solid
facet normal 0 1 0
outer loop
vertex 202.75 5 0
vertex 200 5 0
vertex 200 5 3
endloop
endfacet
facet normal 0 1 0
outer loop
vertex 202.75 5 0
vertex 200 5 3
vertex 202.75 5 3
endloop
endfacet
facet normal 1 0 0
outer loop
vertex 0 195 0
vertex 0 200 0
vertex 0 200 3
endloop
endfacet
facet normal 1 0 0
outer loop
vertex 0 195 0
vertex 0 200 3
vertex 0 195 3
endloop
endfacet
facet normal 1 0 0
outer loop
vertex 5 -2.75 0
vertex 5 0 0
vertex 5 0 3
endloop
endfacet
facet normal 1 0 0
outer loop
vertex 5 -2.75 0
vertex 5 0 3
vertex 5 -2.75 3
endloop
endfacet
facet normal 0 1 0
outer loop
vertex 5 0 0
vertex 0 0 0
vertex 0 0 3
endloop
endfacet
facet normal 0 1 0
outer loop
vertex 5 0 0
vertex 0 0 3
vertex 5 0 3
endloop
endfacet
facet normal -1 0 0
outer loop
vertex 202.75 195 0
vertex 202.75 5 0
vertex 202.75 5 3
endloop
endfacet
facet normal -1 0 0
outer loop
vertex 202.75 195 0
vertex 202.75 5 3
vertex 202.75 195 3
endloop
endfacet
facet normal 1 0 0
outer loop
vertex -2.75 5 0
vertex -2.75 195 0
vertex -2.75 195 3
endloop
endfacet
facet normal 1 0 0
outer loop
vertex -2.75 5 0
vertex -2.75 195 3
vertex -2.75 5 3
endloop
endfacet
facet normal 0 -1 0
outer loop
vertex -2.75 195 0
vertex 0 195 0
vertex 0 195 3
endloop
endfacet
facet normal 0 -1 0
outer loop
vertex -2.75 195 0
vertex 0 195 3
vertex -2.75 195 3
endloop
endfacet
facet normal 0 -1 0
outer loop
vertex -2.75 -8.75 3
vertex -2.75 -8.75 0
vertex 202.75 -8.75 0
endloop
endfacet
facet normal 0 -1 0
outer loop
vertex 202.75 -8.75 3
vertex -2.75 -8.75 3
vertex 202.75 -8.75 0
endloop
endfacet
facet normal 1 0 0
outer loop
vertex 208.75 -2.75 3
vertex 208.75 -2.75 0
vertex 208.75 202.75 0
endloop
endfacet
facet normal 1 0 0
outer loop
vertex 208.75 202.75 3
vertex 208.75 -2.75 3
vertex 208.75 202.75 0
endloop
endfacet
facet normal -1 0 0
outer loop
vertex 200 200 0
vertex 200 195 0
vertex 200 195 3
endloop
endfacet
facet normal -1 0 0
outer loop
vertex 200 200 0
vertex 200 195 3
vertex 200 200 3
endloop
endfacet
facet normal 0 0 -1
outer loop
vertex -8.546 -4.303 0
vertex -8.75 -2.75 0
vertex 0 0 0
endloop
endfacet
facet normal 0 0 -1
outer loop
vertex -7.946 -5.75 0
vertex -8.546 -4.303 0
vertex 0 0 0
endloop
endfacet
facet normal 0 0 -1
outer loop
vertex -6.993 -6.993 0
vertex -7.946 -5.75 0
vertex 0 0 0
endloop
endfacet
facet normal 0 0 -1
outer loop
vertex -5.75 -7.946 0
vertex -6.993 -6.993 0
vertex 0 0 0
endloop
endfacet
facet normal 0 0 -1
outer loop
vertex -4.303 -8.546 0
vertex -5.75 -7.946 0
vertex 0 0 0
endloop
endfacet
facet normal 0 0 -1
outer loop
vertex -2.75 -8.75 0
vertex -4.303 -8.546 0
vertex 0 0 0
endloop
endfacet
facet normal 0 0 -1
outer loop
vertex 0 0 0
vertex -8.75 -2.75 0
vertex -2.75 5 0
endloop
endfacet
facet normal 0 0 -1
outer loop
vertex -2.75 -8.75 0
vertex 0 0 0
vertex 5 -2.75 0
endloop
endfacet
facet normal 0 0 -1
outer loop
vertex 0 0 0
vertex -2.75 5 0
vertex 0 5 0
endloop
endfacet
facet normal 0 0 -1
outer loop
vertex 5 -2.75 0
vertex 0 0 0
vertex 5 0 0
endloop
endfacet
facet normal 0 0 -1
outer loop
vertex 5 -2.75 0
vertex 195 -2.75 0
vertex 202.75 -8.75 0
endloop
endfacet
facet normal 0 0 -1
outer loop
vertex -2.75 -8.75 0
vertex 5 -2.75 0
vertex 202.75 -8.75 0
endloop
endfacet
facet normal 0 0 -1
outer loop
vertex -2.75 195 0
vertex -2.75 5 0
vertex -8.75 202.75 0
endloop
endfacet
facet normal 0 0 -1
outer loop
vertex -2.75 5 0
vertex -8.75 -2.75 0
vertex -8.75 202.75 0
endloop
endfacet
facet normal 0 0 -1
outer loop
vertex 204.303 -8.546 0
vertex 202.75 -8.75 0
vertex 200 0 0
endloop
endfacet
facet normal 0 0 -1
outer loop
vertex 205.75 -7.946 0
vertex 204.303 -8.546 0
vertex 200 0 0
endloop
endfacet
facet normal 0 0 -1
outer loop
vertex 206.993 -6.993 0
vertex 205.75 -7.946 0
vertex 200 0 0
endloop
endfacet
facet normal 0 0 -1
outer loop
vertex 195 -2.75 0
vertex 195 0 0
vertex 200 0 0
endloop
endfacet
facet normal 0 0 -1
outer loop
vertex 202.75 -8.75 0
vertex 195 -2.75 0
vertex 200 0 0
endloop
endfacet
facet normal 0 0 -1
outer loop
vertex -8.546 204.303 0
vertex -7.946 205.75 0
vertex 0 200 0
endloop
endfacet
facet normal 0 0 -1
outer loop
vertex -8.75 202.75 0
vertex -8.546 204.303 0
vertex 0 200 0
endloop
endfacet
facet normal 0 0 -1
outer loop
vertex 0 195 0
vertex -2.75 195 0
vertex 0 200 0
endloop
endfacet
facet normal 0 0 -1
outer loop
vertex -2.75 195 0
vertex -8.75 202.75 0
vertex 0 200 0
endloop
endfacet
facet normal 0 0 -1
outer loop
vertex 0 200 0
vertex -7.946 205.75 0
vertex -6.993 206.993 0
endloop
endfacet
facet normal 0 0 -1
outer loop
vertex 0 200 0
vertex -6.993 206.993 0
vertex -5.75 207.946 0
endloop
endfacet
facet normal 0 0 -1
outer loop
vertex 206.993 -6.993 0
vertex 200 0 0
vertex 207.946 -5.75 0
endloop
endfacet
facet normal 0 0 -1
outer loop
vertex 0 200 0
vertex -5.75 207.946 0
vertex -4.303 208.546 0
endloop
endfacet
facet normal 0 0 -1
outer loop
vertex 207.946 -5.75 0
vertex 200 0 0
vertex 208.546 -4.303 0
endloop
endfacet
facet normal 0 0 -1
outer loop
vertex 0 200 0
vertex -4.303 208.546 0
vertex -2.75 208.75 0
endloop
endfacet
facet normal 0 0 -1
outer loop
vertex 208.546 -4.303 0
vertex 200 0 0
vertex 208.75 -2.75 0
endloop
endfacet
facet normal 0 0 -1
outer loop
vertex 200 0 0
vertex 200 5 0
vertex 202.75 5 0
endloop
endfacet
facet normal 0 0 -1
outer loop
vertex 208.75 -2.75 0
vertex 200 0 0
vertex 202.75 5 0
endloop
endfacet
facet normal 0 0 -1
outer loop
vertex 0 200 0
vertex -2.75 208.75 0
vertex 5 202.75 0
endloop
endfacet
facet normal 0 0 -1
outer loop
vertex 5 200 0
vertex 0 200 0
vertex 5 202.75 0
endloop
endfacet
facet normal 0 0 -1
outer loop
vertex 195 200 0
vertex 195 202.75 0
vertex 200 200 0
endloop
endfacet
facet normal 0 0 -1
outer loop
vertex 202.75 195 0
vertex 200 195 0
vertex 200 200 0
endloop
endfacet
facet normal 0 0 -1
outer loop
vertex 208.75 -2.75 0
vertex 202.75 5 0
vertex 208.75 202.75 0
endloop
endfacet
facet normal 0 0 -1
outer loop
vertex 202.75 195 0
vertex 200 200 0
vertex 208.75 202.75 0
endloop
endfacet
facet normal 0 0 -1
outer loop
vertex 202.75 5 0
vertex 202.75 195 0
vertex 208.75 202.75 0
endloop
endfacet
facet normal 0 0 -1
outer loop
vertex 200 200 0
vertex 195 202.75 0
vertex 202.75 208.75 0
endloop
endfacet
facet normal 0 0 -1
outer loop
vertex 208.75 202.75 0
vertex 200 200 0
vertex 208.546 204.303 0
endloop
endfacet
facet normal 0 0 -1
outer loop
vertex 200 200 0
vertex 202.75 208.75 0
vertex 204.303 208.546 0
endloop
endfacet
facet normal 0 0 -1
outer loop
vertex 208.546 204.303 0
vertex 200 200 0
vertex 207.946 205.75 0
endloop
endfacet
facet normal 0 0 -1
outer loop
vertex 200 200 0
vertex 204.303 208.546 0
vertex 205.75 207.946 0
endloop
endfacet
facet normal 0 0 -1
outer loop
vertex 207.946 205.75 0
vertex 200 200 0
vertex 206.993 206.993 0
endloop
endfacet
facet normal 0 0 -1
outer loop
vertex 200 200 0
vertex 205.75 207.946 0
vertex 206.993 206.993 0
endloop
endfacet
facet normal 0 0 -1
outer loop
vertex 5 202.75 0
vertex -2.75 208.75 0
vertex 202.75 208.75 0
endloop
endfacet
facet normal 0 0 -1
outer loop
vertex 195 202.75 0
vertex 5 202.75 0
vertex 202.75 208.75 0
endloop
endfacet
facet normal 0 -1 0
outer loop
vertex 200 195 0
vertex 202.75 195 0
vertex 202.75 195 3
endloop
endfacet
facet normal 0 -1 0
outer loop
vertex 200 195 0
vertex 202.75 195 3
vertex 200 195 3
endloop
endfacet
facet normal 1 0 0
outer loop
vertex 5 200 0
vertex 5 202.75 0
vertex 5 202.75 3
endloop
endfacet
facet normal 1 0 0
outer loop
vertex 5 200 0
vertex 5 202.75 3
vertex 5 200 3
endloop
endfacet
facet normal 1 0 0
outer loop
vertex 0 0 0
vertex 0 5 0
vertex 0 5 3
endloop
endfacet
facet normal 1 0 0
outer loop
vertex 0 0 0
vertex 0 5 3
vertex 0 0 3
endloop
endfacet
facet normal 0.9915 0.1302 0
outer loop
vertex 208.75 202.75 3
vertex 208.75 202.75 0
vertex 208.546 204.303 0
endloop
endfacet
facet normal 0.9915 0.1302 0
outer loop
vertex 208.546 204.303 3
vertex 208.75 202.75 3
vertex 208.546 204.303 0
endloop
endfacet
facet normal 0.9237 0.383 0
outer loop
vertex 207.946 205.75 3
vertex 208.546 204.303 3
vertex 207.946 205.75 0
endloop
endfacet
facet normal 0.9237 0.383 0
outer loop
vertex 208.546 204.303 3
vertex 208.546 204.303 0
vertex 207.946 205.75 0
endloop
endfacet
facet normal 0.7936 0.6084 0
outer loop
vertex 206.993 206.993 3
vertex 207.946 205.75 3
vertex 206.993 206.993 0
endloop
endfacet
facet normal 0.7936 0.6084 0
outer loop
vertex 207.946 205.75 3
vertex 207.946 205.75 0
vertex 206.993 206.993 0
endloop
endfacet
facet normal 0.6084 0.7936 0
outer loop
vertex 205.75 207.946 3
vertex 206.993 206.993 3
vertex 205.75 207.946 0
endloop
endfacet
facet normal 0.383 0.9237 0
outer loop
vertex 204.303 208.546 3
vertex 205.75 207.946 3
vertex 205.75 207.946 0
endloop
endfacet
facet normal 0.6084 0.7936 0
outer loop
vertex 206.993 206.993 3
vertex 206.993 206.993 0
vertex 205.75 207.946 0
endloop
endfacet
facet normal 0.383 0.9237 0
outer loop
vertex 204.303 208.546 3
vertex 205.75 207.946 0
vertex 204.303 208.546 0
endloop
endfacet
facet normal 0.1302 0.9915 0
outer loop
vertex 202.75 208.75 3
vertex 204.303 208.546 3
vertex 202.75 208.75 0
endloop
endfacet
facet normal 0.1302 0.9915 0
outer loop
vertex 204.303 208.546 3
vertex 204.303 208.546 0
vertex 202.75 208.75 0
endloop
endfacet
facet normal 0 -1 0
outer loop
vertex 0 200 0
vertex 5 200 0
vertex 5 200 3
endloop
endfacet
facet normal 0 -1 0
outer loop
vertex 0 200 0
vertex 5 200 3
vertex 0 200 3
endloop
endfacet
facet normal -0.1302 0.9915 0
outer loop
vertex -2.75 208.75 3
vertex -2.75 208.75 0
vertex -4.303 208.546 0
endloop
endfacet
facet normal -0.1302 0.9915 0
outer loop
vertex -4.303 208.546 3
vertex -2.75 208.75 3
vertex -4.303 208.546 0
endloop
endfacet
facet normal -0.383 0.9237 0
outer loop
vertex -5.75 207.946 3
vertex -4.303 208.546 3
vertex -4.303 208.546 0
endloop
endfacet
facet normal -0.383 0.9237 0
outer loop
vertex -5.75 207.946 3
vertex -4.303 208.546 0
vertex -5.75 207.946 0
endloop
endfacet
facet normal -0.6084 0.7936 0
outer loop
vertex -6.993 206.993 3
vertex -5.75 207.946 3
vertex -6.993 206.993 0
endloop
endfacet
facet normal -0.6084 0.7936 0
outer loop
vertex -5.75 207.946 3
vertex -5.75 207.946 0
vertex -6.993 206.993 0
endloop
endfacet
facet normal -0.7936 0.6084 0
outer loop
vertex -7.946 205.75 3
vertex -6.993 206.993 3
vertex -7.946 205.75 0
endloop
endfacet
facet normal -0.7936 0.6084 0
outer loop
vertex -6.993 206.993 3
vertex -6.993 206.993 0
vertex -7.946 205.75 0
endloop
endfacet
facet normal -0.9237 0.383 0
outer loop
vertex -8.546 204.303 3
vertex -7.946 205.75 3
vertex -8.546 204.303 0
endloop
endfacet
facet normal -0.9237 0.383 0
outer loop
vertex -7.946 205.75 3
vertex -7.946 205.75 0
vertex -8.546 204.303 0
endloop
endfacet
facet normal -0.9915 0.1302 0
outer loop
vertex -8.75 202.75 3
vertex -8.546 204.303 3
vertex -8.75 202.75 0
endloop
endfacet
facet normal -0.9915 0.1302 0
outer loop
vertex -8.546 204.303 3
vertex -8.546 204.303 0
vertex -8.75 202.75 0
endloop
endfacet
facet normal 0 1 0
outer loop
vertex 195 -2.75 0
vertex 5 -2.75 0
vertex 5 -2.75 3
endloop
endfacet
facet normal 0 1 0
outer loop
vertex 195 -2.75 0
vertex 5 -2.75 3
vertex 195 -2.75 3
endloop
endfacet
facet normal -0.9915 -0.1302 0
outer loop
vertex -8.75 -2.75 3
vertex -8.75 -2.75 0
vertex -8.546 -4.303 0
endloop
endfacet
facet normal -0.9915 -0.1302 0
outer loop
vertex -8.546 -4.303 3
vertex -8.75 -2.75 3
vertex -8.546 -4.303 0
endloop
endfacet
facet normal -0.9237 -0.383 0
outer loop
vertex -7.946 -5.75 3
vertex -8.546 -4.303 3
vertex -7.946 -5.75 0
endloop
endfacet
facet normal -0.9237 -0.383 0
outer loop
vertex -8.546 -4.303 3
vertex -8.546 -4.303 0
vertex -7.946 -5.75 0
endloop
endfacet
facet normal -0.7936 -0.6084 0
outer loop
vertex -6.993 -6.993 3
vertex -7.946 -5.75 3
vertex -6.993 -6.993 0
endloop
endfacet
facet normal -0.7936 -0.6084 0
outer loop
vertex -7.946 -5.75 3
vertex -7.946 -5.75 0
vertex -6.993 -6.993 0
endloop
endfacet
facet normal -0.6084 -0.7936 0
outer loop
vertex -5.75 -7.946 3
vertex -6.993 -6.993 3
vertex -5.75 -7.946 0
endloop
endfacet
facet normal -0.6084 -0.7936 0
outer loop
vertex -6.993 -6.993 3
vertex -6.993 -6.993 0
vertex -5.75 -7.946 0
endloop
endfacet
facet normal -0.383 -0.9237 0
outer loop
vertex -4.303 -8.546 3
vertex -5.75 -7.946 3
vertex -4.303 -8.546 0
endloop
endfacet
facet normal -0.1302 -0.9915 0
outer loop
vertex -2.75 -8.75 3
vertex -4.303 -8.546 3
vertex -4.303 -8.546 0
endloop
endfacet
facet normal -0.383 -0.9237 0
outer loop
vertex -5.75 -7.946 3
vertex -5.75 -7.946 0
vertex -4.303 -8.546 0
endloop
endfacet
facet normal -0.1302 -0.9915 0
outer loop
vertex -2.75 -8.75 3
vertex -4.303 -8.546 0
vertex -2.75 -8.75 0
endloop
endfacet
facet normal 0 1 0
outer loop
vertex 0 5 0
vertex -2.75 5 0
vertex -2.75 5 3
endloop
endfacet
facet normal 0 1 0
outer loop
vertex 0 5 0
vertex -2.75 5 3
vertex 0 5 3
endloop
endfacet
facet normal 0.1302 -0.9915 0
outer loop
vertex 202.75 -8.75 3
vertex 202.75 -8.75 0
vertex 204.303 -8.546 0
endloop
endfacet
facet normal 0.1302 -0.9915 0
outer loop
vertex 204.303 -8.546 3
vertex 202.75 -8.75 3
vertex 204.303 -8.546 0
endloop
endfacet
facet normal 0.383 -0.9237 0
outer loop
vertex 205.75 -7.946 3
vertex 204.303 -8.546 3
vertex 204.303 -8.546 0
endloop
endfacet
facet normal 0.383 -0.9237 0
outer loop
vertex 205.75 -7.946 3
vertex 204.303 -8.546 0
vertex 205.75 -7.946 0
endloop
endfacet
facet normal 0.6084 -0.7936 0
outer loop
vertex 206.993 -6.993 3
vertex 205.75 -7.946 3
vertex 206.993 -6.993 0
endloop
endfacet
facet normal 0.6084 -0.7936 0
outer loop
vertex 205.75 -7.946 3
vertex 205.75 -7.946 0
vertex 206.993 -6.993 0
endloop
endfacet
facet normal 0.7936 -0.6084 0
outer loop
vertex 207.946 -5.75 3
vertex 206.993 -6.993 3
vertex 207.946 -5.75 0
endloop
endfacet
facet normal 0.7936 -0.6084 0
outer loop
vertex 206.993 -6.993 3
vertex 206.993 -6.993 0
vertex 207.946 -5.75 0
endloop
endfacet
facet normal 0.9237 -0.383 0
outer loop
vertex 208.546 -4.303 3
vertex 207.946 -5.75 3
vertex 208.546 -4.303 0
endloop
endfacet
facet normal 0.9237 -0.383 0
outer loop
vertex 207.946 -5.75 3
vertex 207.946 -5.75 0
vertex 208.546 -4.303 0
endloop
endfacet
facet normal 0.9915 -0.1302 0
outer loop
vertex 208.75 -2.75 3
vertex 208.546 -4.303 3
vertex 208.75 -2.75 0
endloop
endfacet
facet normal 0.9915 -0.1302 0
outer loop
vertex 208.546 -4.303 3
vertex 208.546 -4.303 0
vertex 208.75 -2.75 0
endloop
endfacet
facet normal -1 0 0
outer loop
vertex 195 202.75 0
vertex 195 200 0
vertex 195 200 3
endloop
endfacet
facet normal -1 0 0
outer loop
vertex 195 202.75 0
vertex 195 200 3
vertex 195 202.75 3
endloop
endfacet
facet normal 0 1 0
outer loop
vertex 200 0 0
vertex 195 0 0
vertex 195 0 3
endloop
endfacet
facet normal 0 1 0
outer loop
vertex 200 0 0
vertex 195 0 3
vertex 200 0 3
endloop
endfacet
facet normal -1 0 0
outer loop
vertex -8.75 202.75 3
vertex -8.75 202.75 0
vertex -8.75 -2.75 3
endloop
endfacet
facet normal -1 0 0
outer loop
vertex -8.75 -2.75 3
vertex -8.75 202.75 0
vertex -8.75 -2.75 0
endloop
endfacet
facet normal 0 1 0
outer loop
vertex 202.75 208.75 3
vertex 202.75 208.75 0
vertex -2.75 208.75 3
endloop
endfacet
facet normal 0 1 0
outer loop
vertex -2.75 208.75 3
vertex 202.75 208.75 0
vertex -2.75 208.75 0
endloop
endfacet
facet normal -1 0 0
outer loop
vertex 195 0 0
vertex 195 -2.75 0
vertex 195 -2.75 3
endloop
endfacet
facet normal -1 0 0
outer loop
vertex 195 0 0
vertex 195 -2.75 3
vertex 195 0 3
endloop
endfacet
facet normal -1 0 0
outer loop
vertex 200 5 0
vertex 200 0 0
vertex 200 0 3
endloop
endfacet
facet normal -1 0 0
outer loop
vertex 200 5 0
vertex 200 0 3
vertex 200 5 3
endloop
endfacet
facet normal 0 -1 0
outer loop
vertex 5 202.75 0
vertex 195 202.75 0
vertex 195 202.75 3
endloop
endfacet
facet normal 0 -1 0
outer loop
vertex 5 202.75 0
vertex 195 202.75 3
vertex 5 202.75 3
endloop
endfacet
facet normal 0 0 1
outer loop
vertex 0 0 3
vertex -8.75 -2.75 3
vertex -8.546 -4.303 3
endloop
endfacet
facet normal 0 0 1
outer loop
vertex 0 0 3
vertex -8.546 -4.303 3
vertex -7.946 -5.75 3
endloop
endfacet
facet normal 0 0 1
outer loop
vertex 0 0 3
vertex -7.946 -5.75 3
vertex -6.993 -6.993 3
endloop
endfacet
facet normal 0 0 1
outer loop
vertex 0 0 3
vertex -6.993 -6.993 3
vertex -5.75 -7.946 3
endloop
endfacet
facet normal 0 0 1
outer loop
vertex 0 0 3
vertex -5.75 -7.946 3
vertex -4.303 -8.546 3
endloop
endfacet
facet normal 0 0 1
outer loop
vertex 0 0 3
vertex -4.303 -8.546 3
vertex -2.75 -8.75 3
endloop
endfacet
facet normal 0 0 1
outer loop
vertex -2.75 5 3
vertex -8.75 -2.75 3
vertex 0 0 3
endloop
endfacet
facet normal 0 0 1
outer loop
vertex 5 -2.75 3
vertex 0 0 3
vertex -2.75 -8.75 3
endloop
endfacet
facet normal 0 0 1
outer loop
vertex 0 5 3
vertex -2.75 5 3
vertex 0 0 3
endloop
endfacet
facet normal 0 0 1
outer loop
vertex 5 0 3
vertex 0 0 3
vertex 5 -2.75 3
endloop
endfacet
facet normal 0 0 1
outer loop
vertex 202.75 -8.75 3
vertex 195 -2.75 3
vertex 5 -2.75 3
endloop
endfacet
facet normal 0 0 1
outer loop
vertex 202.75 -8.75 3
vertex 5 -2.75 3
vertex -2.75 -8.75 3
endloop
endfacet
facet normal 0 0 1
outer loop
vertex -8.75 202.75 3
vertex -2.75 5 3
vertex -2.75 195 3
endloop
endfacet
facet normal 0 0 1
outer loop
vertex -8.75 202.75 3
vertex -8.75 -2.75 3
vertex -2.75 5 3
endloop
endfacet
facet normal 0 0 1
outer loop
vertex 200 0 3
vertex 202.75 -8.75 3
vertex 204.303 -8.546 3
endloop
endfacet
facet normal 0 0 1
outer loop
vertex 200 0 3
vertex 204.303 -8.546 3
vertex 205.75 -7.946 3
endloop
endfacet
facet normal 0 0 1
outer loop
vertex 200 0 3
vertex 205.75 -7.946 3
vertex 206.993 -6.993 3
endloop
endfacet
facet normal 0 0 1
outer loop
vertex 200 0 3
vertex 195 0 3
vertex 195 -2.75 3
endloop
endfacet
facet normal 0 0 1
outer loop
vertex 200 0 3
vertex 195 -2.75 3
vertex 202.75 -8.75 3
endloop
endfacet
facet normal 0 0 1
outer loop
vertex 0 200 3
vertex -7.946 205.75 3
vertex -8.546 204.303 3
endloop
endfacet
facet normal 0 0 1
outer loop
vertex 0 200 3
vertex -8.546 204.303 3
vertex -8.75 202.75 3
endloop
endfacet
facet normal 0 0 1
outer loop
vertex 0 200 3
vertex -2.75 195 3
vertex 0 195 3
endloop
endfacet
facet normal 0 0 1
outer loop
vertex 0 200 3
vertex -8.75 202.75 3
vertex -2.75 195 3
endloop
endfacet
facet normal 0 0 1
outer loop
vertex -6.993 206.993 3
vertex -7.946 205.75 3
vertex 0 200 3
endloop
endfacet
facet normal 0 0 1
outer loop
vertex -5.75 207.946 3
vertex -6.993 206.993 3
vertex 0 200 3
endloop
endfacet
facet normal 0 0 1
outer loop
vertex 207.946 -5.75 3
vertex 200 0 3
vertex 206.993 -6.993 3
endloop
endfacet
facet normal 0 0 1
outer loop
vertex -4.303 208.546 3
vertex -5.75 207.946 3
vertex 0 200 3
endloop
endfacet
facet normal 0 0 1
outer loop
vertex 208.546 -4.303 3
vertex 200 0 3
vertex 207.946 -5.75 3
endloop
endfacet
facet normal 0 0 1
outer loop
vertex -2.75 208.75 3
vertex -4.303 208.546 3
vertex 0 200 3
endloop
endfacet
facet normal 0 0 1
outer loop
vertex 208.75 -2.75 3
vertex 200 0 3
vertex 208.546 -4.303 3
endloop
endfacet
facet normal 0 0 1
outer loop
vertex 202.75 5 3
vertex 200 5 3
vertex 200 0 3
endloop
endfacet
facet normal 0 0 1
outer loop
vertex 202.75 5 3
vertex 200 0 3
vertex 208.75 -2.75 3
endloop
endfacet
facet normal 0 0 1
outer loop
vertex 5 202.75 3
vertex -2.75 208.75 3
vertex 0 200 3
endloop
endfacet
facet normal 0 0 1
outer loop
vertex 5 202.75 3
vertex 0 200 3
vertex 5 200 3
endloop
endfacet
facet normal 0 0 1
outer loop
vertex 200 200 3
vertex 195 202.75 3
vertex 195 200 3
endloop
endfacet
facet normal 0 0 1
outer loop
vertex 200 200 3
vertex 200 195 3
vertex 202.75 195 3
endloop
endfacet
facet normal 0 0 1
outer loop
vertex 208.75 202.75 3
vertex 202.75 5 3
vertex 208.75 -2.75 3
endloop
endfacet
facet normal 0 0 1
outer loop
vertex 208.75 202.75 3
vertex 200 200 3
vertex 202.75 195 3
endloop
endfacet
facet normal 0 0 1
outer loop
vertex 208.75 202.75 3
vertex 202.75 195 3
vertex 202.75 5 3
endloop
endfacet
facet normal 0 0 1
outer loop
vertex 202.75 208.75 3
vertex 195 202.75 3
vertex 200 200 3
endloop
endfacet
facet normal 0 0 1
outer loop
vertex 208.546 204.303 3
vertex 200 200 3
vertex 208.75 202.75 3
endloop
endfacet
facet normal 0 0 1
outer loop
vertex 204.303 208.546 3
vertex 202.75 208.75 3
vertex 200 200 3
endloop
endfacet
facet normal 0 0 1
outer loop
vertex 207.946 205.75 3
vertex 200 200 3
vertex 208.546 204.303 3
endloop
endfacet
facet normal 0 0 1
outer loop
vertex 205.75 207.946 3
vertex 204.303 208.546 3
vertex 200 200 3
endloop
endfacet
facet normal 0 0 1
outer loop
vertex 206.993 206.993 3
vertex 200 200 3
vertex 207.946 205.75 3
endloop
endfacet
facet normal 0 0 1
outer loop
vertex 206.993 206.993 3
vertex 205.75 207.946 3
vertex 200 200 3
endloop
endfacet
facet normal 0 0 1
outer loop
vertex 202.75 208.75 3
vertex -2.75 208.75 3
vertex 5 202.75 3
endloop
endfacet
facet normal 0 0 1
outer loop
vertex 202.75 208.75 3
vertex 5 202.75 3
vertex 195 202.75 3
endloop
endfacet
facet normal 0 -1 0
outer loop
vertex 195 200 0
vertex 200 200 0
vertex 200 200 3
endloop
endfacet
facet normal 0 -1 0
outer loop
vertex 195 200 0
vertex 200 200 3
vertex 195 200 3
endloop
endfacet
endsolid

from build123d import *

# Parameters (mm, degrees)
EXTRUDE_1_DEPTH = 3


with BuildPart() as part:
    # 草图1 → 凸台-拉伸1 (new body)
    with BuildSketch(Plane.XY):
        with BuildLine():
            Line((-8.75, 202.75), (-8.75, -2.75))
            ThreePointArc((-8.75, -2.75), (-6.992640687, -6.992640687), (-2.75, -8.75))
            Line((-2.75, -8.75), (202.75, -8.75))
            ThreePointArc((202.75, -8.75), (206.992640687, -6.992640687), (208.75, -2.75))
            Line((208.75, -2.75), (208.75, 202.75))
            ThreePointArc((208.75, 202.75), (206.992640687, 206.992640687), (202.75, 208.75))
            Line((202.75, 208.75), (-2.75, 208.75))
            ThreePointArc((-2.75, 208.75), (-6.992640687, 206.992640687), (-8.75, 202.75))
        make_face()
        Polygon((5, 202.75), (5, 200), (0, 200), (0, 195), (-2.75, 195), (-2.75, 5), (0, 5), (0, 0), (5, 0), (5, -2.75), (195, -2.75), (195, 0), (200, 0), (200, 5), (202.75, 5), (202.75, 195), (200, 195), (200, 200), (195, 200), (195, 202.75), align=None, mode=Mode.SUBTRACT)
    extrude(amount=EXTRUDE_1_DEPTH)


solid = part.part
